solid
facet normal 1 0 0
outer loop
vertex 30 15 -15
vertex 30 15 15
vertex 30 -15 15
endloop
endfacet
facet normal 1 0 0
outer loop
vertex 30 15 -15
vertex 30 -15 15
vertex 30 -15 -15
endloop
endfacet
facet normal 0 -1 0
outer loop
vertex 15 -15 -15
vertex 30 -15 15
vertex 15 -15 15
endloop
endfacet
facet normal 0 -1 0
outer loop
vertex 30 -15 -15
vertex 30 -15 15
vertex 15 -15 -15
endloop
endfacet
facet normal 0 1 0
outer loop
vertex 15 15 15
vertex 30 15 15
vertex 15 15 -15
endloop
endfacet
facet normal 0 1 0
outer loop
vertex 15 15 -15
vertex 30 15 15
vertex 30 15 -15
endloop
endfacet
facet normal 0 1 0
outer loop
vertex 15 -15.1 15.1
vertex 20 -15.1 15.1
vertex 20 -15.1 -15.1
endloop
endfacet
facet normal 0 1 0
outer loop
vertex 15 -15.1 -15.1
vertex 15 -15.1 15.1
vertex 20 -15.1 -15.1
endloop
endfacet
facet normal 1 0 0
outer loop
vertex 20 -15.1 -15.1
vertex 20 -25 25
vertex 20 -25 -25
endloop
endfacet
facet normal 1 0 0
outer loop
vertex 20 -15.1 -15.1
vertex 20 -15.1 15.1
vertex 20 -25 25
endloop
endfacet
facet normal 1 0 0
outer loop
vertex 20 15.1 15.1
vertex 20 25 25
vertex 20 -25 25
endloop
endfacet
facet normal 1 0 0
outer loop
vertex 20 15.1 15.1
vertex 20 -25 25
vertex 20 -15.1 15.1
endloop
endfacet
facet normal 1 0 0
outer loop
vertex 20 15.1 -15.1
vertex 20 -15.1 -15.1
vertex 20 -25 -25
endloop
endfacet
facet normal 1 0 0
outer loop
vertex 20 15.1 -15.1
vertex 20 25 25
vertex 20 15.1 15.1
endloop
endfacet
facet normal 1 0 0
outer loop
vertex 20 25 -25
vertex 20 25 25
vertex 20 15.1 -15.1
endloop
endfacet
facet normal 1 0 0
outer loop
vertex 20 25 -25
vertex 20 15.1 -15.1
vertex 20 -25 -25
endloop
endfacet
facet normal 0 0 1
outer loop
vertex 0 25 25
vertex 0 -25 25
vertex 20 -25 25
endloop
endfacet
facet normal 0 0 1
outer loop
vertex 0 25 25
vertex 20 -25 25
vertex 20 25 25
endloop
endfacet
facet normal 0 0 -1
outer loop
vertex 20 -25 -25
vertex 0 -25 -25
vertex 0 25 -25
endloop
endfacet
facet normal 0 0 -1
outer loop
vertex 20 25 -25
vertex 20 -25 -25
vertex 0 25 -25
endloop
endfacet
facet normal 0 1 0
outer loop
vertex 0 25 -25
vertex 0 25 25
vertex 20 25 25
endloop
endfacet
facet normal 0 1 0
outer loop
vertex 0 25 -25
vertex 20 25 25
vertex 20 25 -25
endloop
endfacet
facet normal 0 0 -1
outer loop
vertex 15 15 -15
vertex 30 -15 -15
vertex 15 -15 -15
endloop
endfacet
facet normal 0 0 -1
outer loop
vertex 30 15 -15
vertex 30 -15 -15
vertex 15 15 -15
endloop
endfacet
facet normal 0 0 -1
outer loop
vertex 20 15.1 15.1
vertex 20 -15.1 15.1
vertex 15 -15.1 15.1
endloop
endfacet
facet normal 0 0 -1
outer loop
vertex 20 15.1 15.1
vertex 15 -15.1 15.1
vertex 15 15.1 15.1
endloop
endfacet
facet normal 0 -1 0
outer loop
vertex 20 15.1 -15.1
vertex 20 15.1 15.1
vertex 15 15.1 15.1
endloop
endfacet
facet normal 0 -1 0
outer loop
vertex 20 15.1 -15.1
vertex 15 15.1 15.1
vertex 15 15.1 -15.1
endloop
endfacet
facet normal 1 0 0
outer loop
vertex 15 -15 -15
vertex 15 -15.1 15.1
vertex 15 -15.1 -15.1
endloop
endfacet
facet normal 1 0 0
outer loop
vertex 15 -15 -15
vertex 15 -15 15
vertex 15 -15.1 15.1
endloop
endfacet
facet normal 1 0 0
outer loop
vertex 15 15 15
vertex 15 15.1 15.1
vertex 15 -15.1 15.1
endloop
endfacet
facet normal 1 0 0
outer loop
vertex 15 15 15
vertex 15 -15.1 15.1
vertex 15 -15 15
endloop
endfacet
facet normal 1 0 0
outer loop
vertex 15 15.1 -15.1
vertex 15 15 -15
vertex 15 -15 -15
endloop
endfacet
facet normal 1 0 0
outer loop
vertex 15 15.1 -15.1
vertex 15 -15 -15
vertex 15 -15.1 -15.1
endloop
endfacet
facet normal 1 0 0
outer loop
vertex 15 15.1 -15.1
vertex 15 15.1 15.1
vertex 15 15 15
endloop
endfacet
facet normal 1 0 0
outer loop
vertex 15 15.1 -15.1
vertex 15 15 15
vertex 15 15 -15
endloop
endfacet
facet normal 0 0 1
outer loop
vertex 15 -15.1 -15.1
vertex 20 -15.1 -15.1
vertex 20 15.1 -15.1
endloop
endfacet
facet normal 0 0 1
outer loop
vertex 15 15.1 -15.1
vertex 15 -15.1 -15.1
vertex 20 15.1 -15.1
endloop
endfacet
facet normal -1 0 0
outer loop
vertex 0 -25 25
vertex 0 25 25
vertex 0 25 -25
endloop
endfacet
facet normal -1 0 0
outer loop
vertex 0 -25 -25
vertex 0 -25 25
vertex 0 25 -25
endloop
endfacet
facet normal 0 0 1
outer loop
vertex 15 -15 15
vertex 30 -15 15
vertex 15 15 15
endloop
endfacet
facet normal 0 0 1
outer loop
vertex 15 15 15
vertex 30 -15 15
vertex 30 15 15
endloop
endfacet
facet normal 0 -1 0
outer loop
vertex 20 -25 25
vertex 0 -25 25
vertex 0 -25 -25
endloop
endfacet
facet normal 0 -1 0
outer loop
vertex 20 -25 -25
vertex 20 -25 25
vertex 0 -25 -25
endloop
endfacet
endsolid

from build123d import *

# Parameters (mm, degrees)
SKETCH_1_W          = 50
SKETCH_1_H          = 50
EXTRUDE_1_DEPTH     = 20
SKETCH_2_W          = 30
SKETCH_2_H          = 30
EXTRUDE_2_DEPTH     = 10
SKETCH_3_W          = 30.2
SKETCH_3_H          = 30.2
SKETCH_3_W_2        = 30
SKETCH_3_H_2        = 30
CUT_EXTRUDE_1_DEPTH = 15


with BuildPart() as part:
    # 草图1 → 凸台-拉伸1 (new body)
    with BuildSketch(Plane(origin=(0, 0, 0), x_dir=(0, 0, -1), z_dir=(1, 0, 0))):
        Rectangle(SKETCH_1_W, SKETCH_1_H)
    extrude(amount=EXTRUDE_1_DEPTH)

    # 草图2 → 凸台-拉伸2 (add)
    with BuildSketch(Plane(origin=(20, 0, 0), x_dir=(0, 0, -1), z_dir=(1, 0, 0))):
        Rectangle(SKETCH_2_W, SKETCH_2_H)
    extrude(amount=EXTRUDE_2_DEPTH)

    # 草图3 → 切除-拉伸1 (cut)
    with BuildSketch(Plane(origin=(30, 0, 0), x_dir=(0, 0, -1), z_dir=(1, 0, 0))):
        Rectangle(SKETCH_3_W, SKETCH_3_H)
        Rectangle(SKETCH_3_W_2, SKETCH_3_H_2, mode=Mode.SUBTRACT)
    extrude(amount=-CUT_EXTRUDE_1_DEPTH, mode=Mode.SUBTRACT)


solid = part.part
